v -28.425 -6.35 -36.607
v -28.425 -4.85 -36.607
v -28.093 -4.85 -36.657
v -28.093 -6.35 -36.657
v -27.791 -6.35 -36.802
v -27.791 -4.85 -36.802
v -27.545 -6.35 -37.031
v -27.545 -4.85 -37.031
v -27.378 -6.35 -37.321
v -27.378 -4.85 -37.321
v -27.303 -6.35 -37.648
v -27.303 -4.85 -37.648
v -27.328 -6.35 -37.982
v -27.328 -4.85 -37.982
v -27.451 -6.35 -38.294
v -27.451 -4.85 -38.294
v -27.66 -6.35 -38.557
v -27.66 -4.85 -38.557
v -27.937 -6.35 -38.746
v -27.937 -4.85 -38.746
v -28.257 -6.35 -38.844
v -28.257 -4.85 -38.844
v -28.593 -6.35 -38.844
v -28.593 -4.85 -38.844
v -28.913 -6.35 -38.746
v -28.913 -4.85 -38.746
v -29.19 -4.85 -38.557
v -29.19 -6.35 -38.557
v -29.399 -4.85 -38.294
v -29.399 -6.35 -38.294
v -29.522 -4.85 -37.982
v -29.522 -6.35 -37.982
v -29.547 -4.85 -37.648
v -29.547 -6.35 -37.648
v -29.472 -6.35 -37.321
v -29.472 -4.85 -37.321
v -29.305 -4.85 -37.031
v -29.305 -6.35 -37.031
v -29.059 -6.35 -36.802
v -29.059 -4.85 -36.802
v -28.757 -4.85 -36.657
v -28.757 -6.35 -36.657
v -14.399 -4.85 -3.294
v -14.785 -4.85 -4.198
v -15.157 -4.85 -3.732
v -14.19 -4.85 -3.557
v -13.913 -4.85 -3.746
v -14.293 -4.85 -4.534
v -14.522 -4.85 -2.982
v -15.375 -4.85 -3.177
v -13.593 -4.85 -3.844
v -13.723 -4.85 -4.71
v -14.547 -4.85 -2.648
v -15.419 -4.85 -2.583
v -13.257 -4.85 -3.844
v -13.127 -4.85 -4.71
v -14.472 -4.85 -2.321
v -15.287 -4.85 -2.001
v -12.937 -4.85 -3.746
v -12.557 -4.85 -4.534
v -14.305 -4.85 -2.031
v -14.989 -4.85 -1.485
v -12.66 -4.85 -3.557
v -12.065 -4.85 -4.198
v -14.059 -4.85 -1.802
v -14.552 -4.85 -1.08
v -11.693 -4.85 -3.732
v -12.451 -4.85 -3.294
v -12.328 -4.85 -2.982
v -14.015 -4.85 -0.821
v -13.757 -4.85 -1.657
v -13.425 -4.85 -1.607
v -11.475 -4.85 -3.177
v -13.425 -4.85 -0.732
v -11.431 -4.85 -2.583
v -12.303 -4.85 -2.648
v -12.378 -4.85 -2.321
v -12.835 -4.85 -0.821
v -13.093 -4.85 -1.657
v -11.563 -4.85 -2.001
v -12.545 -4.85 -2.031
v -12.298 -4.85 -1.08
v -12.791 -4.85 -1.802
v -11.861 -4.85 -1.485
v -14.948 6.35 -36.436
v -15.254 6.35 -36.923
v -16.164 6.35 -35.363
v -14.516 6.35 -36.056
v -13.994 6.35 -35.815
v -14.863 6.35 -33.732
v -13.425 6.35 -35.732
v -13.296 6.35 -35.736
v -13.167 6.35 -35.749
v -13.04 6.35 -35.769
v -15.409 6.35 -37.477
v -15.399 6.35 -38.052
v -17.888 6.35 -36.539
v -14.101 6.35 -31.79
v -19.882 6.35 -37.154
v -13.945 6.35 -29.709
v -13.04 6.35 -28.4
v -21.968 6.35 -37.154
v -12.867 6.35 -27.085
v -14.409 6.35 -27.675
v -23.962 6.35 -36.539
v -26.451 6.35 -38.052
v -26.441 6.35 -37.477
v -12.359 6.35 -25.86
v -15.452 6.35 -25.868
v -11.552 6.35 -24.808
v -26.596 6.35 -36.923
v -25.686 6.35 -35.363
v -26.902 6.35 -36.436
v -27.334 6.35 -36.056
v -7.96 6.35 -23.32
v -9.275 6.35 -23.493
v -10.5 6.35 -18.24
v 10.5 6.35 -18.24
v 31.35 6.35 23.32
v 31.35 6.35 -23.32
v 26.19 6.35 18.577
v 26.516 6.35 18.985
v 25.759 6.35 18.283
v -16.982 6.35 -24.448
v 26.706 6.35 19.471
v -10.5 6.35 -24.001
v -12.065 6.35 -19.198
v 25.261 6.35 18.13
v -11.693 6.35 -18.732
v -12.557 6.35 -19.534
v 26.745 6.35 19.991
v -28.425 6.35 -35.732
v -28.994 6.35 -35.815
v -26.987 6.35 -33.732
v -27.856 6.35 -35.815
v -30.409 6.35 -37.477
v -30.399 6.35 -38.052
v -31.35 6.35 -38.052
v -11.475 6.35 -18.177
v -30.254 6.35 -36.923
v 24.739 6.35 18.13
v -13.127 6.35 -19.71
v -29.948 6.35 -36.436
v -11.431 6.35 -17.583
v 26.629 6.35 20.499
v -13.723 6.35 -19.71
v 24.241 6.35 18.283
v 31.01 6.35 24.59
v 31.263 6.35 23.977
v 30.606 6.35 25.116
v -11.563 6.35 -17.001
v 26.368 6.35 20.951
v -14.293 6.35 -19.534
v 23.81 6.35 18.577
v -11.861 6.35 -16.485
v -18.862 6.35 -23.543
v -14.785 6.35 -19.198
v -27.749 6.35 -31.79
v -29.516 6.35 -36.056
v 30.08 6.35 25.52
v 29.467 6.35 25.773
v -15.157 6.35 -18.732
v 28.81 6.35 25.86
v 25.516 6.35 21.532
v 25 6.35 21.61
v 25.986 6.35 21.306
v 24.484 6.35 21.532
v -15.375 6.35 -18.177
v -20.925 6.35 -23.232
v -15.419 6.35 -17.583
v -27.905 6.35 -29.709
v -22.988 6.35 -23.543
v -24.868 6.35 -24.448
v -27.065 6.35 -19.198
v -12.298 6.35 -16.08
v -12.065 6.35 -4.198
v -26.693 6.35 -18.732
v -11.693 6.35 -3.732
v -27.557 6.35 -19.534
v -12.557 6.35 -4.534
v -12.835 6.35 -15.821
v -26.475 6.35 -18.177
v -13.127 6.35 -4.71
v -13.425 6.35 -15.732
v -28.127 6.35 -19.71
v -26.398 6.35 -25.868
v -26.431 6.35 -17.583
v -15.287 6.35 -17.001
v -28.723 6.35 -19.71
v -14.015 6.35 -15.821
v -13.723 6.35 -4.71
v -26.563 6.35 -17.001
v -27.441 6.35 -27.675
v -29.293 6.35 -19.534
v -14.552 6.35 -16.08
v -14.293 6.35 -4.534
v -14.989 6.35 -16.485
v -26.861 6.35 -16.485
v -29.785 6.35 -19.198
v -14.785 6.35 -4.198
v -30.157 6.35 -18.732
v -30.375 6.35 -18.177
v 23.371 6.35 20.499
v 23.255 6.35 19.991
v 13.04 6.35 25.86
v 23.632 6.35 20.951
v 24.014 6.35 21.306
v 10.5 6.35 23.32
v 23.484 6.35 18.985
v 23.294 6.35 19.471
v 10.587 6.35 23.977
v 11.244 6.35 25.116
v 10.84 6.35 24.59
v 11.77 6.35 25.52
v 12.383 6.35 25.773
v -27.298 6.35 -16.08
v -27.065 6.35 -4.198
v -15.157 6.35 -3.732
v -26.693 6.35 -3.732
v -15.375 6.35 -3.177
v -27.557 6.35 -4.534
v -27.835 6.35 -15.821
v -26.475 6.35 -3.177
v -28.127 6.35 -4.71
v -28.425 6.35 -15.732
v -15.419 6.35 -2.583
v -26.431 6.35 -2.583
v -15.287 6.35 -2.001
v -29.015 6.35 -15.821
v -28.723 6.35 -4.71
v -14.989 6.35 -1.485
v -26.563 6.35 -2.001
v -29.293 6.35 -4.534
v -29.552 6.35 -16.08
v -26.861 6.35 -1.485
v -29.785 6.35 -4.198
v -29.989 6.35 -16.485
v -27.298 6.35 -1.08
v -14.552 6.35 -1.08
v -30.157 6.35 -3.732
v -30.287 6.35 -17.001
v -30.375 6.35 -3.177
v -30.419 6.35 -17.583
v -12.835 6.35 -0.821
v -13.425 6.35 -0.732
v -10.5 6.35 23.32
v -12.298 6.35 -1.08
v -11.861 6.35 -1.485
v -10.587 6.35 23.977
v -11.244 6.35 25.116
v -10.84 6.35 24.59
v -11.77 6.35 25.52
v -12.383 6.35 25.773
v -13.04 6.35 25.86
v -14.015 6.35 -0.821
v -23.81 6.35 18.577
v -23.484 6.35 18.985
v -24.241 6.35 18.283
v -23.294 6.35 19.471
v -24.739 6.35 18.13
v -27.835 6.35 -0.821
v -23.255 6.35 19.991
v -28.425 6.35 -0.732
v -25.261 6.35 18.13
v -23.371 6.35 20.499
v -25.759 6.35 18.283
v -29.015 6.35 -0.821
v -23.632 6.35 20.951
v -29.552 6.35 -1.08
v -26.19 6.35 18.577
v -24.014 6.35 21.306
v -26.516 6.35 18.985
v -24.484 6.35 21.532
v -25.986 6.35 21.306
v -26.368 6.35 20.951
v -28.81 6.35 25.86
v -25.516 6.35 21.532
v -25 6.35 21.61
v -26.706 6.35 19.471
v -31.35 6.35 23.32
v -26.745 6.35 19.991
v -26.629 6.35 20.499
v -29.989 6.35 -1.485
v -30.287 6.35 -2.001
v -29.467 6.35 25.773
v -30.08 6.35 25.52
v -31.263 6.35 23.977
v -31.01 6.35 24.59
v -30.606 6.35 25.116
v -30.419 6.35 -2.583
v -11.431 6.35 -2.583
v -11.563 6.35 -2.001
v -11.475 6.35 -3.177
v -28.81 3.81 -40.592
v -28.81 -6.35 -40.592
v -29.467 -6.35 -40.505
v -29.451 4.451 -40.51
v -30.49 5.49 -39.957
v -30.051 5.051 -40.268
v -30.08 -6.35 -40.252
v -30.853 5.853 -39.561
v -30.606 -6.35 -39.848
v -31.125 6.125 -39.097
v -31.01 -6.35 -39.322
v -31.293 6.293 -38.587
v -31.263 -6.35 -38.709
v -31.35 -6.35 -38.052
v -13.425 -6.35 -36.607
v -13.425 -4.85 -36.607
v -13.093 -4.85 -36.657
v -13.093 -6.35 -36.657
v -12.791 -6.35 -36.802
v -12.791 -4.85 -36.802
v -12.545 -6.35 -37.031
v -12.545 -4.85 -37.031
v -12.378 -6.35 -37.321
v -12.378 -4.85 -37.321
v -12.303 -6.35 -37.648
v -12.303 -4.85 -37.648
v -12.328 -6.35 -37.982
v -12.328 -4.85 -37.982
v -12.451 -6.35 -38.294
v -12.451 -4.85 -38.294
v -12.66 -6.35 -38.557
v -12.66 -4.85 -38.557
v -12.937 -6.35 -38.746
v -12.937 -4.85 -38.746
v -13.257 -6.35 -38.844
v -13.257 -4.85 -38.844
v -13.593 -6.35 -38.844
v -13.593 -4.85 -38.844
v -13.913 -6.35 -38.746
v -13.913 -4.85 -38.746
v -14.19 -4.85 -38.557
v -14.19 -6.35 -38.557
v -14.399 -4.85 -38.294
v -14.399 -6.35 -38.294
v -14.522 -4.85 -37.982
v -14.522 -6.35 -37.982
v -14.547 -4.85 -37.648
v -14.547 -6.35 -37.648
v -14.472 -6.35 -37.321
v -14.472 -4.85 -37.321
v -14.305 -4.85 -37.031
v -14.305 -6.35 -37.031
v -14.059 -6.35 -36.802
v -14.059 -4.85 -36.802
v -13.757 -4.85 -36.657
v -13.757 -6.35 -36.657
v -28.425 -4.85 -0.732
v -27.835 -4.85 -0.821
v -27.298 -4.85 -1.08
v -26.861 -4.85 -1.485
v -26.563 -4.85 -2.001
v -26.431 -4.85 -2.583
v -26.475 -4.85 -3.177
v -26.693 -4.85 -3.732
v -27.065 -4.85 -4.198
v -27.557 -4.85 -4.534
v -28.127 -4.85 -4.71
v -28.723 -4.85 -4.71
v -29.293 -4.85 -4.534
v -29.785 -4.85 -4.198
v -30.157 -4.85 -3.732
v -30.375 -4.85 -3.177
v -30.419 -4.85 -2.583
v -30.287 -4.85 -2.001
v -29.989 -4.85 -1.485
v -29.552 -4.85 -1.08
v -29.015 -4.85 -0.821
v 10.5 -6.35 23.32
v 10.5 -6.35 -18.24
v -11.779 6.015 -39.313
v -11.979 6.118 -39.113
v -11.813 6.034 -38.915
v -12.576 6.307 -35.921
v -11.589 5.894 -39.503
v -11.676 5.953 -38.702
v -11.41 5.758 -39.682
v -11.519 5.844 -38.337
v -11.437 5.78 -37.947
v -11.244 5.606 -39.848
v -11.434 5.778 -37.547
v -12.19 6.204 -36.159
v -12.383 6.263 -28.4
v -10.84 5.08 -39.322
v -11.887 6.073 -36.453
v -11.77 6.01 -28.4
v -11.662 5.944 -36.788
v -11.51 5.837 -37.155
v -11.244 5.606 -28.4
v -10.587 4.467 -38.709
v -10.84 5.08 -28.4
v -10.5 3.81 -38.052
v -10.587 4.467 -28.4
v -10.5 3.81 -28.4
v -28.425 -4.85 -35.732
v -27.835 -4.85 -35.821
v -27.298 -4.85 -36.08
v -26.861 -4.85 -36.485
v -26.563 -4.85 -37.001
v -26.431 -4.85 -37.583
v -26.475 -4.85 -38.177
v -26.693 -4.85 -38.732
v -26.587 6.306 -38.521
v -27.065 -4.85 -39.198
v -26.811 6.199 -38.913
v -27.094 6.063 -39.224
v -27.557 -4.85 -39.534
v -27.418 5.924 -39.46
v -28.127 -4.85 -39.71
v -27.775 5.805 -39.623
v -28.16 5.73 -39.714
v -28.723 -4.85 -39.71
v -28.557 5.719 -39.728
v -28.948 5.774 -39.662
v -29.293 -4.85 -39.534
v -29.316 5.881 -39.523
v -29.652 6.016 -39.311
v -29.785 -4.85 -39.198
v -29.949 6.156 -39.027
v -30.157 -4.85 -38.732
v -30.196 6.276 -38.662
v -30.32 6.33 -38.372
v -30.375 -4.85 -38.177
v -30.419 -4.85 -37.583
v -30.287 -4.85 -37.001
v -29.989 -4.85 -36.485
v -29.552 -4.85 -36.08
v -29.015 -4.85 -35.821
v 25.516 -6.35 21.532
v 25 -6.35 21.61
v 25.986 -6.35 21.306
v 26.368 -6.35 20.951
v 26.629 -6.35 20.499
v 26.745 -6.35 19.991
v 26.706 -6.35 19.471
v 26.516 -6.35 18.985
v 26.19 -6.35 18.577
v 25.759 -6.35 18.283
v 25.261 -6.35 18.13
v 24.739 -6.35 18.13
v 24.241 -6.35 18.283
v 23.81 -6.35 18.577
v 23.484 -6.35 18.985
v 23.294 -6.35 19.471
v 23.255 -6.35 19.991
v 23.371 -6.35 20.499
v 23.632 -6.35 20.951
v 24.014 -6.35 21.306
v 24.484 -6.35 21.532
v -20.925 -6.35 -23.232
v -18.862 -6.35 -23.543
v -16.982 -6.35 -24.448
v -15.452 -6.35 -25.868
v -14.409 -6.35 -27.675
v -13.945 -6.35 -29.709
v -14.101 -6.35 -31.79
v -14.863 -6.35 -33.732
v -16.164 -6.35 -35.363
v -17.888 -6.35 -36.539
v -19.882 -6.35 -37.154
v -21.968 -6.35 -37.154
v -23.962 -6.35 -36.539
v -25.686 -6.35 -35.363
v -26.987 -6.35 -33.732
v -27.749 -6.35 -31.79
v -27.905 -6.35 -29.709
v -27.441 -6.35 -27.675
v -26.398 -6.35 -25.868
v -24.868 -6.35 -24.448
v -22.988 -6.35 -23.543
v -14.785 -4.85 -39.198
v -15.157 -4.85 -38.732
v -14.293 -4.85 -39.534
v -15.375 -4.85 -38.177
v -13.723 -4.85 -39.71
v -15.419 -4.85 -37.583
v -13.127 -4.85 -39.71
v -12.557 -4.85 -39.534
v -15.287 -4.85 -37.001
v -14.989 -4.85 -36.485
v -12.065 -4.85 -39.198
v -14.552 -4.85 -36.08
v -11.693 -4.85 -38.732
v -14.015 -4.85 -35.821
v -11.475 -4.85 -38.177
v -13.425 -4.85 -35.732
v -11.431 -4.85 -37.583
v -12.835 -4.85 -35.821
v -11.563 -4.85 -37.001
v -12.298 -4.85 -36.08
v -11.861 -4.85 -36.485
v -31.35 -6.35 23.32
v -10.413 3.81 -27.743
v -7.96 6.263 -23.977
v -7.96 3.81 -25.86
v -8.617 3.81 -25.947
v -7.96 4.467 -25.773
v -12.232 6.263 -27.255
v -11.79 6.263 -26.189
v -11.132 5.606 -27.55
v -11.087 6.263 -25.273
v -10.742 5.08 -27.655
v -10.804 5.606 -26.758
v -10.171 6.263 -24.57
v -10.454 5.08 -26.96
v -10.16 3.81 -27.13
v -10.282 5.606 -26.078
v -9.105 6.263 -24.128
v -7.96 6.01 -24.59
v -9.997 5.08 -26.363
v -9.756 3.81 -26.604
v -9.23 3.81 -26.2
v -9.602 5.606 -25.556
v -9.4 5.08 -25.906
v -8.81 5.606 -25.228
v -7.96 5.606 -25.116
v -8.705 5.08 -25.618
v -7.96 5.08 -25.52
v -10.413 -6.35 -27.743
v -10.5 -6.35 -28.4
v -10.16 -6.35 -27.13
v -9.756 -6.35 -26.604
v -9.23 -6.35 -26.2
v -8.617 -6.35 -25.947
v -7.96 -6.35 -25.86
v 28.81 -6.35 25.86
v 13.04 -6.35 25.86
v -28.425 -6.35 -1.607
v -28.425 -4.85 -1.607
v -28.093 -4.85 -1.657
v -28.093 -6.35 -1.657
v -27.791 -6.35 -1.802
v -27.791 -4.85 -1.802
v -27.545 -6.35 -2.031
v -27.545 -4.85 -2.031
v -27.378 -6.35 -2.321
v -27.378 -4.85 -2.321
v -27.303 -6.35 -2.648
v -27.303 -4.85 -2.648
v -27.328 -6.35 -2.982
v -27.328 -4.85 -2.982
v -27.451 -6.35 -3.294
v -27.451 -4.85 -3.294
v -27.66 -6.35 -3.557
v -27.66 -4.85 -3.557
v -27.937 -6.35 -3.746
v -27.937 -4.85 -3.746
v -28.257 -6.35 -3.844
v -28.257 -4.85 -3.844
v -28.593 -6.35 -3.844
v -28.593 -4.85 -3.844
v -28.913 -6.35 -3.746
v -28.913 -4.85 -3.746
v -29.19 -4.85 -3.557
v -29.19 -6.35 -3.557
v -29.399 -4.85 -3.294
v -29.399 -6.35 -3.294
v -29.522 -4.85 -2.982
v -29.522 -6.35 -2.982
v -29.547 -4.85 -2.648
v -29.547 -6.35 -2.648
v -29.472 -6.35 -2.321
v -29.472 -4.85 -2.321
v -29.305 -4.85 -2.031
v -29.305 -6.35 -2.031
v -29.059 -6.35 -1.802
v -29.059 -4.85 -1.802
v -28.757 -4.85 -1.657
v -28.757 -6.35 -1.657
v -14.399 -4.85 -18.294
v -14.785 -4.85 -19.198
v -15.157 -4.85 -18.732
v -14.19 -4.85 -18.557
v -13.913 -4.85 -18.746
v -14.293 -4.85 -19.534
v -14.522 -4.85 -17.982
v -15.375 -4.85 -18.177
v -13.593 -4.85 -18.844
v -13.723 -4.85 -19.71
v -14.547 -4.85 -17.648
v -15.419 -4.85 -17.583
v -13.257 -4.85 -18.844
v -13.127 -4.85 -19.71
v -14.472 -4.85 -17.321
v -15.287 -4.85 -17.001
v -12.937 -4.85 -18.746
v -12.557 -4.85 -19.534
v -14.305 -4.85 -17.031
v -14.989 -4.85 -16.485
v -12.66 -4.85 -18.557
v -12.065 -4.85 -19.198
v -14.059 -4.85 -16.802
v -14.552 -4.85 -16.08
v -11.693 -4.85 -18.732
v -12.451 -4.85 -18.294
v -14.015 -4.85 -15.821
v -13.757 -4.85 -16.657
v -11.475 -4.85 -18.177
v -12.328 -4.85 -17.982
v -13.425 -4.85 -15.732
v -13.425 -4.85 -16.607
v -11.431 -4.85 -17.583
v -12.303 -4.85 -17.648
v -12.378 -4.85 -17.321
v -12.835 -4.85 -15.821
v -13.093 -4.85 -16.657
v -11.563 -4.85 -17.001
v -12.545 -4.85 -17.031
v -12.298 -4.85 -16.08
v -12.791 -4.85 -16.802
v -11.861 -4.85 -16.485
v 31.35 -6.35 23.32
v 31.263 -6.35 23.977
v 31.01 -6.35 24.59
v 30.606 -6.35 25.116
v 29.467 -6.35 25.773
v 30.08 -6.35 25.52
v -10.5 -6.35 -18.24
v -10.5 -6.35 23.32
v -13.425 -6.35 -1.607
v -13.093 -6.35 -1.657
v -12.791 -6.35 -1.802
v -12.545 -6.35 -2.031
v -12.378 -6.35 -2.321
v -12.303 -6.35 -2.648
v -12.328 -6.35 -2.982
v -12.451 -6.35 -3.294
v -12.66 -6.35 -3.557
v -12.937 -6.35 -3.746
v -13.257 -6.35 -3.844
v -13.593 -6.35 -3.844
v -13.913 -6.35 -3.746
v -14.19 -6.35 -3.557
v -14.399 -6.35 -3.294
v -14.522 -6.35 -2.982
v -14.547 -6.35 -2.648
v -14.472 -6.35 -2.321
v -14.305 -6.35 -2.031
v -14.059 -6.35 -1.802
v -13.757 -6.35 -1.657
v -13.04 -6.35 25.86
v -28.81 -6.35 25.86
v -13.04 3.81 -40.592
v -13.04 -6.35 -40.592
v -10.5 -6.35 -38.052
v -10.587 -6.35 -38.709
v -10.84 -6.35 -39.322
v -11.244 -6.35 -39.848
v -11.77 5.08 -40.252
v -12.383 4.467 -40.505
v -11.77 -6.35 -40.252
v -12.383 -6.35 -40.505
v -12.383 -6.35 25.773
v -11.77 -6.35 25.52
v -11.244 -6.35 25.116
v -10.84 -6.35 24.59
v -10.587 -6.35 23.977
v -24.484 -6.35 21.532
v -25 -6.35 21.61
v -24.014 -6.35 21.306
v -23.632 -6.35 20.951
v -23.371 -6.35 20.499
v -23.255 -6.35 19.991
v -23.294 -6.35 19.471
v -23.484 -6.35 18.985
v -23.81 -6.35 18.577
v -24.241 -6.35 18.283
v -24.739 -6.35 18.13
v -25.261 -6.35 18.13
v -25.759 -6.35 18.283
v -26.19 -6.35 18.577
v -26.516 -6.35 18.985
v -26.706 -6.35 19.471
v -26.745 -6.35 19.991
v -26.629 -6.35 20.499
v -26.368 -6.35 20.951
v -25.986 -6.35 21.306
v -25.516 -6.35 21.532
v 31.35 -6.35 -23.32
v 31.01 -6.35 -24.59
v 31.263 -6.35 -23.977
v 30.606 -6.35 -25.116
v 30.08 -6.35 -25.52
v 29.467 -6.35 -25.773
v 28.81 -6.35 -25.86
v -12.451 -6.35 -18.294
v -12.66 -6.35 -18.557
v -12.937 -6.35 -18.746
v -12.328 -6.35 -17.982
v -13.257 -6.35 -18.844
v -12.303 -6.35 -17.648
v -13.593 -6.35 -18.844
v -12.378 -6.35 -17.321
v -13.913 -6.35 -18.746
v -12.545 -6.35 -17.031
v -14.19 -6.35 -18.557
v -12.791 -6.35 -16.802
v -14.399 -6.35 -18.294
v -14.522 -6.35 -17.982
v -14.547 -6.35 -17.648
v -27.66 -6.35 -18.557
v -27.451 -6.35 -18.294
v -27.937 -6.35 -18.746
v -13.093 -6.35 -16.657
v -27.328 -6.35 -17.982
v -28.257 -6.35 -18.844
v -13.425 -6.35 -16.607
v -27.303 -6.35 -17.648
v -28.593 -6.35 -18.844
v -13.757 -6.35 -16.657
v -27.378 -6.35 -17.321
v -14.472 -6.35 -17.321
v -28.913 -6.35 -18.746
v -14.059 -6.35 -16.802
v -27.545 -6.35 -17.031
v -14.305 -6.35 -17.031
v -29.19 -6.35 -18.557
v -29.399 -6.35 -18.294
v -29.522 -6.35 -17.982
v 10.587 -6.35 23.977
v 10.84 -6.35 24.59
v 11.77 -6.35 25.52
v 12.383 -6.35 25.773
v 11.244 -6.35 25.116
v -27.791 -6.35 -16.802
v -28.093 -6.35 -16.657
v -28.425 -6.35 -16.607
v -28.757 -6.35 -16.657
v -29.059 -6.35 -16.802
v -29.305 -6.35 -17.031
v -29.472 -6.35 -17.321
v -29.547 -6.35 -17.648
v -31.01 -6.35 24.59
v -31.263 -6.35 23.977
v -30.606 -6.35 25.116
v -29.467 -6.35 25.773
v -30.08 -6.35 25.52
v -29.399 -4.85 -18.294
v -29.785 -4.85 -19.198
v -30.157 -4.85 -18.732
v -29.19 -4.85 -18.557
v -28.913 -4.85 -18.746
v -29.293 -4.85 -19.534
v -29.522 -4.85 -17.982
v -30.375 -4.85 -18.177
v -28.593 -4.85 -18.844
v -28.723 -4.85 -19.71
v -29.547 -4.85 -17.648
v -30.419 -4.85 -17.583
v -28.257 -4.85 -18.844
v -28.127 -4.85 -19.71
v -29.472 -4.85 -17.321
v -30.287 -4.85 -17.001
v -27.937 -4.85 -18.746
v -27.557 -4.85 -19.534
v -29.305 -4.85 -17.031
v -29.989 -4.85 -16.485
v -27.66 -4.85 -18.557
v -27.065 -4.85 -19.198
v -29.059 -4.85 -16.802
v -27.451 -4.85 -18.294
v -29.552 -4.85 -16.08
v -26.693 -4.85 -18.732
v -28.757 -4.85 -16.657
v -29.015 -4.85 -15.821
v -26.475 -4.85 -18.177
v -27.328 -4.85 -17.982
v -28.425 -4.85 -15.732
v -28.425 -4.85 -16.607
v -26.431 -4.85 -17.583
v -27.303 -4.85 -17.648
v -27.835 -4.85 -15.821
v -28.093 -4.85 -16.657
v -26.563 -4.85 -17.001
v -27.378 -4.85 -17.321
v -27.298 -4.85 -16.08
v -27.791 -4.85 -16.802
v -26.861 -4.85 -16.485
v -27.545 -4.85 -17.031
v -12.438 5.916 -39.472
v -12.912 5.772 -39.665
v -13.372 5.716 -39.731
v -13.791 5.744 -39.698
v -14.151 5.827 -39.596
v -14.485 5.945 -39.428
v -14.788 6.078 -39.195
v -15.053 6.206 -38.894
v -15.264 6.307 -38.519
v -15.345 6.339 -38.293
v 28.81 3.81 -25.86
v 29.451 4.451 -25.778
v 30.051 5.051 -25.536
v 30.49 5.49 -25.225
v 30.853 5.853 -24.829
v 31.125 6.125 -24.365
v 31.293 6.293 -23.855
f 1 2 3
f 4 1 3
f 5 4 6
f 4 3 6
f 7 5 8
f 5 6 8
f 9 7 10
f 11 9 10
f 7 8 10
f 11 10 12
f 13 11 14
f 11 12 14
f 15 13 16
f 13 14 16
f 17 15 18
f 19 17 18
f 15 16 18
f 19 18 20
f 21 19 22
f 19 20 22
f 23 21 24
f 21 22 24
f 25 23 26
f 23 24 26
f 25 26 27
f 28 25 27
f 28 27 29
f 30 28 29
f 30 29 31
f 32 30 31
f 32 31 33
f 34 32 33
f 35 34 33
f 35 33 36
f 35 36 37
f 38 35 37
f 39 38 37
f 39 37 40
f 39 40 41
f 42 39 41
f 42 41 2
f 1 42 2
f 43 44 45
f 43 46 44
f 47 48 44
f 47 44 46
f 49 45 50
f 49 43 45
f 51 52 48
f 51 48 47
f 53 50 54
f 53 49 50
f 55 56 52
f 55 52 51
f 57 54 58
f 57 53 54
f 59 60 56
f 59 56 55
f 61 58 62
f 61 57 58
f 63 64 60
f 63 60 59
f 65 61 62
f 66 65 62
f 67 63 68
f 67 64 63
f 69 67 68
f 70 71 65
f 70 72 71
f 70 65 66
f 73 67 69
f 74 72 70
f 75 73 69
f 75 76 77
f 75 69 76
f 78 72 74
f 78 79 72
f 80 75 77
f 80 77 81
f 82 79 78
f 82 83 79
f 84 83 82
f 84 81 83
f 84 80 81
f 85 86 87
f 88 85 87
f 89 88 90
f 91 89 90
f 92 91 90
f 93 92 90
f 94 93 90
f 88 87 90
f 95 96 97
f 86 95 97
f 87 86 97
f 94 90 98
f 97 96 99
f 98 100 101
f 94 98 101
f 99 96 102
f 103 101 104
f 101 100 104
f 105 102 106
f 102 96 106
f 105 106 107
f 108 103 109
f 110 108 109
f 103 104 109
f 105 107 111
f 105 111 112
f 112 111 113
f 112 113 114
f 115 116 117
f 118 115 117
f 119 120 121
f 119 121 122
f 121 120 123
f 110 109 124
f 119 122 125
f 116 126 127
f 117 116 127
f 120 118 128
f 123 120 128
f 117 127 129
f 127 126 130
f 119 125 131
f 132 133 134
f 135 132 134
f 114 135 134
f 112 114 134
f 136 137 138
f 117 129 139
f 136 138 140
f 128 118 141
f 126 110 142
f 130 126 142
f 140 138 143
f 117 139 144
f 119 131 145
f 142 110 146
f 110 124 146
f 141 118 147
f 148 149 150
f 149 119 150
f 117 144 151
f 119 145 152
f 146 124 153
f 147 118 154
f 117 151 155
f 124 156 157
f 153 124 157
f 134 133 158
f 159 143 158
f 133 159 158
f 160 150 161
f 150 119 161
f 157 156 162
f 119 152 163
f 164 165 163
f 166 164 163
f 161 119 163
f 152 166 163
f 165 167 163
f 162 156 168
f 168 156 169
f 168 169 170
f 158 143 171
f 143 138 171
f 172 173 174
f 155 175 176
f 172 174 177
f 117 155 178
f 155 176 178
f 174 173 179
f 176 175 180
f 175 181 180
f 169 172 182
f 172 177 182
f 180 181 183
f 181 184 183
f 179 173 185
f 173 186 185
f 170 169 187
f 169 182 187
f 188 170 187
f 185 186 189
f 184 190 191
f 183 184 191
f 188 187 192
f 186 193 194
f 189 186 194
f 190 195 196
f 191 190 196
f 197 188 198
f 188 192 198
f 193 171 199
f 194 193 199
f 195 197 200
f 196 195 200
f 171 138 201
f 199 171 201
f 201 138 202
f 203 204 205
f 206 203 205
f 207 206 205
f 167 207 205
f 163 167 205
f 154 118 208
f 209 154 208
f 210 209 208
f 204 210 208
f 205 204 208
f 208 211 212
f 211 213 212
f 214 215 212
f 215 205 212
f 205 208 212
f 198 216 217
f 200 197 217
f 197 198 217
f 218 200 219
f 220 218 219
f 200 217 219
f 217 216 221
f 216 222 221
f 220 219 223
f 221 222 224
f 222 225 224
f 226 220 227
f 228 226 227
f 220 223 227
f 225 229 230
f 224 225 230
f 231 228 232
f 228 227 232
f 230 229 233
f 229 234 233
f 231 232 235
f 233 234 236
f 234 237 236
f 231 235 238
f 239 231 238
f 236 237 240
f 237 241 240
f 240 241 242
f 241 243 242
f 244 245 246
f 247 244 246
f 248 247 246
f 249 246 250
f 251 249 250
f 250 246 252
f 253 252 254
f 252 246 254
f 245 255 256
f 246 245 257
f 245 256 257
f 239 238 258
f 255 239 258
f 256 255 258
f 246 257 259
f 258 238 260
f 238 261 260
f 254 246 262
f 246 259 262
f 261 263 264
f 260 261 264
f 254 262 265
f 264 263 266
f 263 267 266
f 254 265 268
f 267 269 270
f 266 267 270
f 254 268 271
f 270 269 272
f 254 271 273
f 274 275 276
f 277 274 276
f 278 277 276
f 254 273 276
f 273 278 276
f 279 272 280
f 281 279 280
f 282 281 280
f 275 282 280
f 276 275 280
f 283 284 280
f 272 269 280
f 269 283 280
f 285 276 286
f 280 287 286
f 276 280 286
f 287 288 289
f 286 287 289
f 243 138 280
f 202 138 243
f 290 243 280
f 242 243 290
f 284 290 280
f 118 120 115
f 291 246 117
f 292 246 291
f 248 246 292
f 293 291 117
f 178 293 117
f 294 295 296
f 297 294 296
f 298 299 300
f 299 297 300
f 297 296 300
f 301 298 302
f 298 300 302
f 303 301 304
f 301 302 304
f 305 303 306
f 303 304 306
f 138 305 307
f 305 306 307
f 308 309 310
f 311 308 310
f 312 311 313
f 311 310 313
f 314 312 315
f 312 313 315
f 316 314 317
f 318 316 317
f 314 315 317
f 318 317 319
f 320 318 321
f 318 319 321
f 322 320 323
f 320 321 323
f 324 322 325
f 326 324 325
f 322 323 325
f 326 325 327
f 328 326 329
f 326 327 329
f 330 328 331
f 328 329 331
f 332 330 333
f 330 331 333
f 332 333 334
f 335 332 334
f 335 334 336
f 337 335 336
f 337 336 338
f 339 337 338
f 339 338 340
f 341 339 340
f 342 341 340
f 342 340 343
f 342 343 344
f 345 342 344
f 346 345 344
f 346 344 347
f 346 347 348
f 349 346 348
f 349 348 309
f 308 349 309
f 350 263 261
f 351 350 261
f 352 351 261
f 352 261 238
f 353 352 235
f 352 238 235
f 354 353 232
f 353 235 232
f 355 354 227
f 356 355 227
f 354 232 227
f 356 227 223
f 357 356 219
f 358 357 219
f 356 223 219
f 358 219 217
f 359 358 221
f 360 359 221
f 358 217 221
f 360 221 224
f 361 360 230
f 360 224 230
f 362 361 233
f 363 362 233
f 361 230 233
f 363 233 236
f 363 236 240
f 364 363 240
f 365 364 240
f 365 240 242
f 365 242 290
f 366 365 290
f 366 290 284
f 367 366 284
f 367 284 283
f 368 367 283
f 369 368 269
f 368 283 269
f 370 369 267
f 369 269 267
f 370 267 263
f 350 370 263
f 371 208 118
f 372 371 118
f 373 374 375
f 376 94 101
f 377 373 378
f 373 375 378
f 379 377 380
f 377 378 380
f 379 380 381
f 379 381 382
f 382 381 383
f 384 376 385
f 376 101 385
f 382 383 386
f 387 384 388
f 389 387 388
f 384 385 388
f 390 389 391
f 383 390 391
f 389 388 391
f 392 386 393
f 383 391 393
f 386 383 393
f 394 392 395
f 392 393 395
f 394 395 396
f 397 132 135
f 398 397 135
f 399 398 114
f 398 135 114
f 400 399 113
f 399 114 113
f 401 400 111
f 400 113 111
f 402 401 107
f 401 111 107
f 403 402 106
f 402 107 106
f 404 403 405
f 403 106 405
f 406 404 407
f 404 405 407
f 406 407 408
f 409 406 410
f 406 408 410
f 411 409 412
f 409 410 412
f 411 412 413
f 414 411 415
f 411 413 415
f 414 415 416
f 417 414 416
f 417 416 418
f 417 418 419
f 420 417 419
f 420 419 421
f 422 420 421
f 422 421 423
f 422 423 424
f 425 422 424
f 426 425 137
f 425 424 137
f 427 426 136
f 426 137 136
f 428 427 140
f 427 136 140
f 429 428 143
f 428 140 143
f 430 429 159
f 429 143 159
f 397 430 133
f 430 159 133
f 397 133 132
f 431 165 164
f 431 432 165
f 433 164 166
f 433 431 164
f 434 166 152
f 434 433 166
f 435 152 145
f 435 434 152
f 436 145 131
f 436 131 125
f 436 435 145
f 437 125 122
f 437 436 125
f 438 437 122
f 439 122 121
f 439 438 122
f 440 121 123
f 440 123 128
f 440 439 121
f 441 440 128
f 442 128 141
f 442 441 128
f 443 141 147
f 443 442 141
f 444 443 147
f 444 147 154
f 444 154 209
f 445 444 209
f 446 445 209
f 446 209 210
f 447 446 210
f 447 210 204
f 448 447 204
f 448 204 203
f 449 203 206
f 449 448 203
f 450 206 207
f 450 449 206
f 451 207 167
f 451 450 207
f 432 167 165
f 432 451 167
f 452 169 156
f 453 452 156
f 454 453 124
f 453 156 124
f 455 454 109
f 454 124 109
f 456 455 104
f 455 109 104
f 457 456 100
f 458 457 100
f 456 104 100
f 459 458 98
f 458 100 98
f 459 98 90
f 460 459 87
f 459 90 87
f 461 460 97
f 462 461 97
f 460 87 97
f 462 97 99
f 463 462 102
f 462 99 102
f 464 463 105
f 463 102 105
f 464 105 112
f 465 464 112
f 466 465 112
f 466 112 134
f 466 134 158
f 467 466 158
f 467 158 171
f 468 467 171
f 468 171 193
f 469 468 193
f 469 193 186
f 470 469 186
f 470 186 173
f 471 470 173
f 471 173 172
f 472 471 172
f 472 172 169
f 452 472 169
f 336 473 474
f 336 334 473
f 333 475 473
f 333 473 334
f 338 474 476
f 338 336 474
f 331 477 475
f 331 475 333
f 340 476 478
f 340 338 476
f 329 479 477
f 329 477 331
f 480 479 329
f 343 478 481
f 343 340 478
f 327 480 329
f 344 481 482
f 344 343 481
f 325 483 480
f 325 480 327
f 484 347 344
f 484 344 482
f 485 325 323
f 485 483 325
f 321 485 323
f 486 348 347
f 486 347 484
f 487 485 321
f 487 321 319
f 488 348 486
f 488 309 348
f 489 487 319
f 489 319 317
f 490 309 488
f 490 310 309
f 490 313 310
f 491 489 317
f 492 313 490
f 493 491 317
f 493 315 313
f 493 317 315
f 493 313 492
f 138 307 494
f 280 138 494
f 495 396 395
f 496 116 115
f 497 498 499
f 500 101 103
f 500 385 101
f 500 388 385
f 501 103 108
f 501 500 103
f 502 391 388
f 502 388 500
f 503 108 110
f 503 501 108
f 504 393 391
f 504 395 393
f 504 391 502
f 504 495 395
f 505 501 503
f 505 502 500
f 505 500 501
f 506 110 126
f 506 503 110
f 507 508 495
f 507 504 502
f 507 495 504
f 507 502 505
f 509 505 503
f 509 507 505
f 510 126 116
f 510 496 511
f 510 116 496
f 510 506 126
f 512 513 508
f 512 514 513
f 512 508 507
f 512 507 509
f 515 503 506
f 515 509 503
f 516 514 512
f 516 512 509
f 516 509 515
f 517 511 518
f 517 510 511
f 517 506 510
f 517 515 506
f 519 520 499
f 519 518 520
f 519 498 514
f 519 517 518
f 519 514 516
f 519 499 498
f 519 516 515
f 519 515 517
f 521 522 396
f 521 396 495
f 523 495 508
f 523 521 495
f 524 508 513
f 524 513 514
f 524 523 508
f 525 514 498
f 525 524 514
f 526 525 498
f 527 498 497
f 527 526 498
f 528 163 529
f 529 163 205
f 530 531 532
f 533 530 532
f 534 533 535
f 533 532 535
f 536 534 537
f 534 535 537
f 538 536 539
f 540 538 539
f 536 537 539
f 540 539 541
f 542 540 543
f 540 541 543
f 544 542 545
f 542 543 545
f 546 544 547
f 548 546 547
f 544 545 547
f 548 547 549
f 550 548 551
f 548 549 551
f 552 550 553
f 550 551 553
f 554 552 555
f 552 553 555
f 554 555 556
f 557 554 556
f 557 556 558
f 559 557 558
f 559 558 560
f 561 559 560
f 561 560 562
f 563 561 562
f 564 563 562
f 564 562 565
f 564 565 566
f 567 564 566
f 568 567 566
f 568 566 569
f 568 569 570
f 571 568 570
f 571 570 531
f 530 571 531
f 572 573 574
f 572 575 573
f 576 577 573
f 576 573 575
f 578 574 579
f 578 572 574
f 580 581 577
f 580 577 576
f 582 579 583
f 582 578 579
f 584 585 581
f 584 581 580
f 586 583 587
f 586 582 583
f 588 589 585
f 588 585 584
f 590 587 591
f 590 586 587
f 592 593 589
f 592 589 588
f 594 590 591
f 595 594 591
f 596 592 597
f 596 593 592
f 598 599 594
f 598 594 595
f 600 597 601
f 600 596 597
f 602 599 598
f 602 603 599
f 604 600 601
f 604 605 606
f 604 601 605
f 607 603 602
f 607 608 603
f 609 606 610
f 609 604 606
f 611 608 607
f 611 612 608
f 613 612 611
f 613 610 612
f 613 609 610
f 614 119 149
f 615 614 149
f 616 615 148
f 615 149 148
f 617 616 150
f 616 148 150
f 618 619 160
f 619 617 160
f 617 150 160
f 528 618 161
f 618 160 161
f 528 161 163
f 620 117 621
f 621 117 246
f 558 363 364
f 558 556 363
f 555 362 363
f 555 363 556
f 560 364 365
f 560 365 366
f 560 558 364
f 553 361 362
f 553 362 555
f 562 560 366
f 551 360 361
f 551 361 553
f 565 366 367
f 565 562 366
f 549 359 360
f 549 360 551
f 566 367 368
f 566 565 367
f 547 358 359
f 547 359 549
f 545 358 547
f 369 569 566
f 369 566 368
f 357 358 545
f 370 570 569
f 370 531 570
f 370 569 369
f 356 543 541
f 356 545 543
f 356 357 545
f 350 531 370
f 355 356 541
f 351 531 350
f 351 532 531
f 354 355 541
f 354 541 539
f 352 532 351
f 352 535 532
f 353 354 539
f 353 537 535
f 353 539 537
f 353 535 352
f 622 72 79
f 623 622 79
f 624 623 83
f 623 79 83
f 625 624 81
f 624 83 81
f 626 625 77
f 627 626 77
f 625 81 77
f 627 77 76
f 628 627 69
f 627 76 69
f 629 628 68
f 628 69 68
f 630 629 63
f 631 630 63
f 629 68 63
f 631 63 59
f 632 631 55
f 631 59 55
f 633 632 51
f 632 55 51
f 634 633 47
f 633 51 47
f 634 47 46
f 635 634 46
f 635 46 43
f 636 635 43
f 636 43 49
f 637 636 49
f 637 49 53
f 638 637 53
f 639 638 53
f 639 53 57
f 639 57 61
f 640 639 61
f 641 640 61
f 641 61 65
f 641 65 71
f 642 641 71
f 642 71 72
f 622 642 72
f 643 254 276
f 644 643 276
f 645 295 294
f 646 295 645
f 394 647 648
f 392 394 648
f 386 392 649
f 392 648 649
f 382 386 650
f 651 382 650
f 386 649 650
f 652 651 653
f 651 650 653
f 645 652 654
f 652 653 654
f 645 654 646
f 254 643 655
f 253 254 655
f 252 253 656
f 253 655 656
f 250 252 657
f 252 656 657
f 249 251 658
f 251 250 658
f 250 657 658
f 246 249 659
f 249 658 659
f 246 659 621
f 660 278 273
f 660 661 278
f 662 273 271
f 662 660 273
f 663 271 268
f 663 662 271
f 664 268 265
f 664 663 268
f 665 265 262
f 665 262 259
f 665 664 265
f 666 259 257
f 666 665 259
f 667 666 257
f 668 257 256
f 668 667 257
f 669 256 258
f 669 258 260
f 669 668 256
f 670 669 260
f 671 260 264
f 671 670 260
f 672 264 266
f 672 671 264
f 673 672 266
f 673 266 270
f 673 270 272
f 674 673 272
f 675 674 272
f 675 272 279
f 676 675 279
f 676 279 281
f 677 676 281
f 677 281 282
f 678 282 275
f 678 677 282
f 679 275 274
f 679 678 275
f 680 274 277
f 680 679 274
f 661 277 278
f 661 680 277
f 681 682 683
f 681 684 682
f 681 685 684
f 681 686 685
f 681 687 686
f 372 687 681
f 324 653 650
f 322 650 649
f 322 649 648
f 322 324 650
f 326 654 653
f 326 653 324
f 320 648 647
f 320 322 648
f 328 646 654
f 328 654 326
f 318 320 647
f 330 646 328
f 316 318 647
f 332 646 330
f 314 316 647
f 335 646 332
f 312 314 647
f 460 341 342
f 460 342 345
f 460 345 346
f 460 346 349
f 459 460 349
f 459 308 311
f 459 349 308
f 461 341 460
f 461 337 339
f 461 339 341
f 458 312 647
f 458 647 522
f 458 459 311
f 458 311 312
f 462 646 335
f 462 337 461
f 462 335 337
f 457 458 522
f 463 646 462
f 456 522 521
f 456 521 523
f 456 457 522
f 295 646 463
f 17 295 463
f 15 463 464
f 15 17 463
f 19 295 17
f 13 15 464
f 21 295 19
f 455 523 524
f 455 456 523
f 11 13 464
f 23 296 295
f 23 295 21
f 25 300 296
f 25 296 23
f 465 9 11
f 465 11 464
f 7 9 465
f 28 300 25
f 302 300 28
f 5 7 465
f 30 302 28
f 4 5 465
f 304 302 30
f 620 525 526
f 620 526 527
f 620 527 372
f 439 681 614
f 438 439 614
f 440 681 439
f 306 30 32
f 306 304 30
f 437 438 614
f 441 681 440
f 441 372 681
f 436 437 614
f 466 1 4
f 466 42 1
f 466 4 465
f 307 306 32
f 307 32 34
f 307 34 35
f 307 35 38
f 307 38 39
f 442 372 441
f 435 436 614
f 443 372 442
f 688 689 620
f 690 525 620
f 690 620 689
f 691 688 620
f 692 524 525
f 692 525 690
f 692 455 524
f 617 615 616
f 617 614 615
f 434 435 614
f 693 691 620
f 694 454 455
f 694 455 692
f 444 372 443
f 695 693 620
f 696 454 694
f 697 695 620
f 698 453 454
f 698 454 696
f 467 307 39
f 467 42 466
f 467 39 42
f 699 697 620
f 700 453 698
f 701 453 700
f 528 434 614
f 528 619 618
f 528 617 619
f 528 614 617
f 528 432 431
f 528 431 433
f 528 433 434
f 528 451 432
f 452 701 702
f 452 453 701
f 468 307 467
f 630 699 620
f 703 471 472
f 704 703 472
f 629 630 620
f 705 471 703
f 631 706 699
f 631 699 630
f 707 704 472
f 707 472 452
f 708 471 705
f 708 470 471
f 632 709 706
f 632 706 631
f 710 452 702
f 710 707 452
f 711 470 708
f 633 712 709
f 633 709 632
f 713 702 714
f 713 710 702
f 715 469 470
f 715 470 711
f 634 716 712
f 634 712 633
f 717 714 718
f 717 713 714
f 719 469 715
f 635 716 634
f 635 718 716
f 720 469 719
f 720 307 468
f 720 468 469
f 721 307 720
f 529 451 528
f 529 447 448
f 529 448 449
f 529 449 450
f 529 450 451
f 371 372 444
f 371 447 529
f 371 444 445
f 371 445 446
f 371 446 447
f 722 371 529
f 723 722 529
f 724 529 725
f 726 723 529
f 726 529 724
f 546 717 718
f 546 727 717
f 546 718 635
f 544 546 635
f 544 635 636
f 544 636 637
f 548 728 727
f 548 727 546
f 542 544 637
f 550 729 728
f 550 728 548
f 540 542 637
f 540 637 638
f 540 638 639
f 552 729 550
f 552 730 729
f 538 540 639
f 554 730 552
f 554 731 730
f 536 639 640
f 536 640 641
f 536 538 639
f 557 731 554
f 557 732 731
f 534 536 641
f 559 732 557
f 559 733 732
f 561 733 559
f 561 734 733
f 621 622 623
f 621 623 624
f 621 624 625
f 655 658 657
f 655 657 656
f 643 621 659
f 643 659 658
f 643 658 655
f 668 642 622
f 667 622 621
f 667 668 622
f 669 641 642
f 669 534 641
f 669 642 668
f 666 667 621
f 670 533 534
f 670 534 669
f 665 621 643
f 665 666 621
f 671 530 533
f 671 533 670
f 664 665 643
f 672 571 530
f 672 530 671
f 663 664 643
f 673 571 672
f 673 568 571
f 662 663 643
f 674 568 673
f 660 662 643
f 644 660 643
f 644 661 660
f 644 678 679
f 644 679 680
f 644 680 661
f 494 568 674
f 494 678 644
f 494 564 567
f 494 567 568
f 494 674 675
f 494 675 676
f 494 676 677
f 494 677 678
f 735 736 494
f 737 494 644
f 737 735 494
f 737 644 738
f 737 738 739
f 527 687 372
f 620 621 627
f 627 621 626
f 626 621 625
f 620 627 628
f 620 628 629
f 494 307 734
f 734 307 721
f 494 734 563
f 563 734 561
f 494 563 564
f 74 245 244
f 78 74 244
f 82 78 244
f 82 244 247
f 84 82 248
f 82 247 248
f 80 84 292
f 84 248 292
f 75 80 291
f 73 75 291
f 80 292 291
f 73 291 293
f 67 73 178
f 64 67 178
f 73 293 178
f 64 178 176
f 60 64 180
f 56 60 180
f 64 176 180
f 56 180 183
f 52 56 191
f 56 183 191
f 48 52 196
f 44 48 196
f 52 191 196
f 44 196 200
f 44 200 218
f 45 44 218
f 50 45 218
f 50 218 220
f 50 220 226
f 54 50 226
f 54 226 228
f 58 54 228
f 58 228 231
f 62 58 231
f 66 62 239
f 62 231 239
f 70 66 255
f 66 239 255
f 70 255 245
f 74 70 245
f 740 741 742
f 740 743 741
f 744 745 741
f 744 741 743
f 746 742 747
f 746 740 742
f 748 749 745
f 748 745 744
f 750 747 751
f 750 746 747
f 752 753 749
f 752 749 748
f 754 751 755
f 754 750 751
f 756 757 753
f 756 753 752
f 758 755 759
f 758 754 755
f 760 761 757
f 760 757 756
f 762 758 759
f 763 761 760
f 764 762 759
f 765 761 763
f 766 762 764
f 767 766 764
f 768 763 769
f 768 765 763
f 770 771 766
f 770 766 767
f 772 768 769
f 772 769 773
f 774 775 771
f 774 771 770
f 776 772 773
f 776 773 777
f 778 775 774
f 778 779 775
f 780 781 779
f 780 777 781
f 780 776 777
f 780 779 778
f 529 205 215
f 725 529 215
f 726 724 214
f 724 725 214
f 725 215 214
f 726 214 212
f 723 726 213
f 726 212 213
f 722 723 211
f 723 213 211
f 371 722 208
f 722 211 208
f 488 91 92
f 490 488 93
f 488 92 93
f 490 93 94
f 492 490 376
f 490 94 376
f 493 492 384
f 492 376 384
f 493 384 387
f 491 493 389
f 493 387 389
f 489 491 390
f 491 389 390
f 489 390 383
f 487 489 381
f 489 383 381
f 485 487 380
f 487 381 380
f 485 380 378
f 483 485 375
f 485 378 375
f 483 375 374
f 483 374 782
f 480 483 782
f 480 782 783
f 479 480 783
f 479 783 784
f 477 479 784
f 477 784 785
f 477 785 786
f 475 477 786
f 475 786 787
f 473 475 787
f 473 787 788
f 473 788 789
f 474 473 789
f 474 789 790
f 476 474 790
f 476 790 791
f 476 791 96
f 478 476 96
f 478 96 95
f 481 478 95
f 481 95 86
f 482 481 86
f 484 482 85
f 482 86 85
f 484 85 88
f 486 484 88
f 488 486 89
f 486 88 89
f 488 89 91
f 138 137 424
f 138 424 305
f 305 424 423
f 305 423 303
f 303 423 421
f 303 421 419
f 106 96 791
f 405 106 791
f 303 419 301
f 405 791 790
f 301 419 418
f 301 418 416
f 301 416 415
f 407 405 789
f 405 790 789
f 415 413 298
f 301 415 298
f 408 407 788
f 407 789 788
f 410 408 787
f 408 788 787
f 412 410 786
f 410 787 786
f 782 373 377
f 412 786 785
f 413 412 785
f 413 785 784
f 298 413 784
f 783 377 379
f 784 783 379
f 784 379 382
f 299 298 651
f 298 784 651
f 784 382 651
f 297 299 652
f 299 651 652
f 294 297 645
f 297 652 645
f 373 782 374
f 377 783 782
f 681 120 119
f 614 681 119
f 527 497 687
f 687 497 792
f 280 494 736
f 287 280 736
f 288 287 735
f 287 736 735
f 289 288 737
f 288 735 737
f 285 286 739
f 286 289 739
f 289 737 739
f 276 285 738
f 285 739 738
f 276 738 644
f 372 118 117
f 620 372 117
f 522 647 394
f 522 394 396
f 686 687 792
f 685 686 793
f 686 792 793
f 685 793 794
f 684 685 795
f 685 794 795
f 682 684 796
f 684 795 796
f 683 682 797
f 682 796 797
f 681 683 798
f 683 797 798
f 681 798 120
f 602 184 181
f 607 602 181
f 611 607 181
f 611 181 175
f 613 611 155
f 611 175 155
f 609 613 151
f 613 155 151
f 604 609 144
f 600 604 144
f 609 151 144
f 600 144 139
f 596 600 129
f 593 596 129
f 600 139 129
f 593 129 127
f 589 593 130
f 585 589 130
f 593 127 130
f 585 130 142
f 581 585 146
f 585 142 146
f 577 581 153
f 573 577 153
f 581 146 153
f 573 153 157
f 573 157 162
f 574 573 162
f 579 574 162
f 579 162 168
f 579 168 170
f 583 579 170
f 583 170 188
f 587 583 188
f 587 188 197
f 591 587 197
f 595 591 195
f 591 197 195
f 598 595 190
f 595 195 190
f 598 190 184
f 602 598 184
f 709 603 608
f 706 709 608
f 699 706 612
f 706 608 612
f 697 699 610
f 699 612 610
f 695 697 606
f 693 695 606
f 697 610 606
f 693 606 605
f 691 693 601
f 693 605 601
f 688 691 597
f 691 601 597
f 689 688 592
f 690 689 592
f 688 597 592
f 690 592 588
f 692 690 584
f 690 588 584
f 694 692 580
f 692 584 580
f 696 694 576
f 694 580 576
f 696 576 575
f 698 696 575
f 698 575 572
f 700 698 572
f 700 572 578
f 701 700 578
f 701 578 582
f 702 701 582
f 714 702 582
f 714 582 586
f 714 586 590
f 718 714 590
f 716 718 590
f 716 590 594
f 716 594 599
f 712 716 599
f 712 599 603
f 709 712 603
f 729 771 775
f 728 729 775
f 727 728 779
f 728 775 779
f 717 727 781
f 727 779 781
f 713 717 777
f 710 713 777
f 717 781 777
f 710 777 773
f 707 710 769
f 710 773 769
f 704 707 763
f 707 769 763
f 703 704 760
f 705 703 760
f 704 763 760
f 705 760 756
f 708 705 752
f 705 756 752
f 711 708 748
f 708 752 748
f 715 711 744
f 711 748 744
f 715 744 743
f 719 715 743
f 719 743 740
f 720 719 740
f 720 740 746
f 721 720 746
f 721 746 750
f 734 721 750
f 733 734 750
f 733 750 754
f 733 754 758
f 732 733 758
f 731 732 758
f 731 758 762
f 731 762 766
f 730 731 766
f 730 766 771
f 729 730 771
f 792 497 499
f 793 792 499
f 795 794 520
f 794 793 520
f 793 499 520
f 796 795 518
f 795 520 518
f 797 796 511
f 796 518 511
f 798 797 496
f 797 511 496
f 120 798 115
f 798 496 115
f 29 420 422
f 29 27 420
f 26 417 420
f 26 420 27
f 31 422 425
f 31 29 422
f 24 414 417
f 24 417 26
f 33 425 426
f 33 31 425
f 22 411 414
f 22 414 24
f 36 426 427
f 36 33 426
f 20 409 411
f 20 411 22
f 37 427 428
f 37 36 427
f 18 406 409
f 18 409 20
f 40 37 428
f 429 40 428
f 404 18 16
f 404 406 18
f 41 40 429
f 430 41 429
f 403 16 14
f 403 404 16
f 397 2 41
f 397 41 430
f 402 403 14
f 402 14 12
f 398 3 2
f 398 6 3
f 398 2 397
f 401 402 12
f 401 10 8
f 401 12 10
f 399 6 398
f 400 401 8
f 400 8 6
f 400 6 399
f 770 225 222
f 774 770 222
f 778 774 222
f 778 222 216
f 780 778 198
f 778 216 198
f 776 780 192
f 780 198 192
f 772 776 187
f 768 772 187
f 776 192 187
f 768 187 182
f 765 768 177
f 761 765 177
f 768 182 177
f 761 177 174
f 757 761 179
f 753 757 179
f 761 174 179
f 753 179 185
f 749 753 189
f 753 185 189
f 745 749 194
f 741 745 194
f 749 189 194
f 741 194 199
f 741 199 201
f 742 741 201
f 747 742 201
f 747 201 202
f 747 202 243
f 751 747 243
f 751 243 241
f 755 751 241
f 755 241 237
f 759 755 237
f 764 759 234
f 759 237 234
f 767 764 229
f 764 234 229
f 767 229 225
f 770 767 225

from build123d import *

# Parameters (mm, degrees)
SKETCH1_R           = 1.75
BOSS_EXTRUDE1_DEPTH = 6.35
SKETCH5_W           = 20.85
SKETCH5_H           = 14.732
BOSS_EXTRUDE2_DEPTH = 12.7
SKETCH2_R           = 1.125
CUT_EXTRUDE1_DEPTH  = 53.837699391
SKETCH3_R           = 2
CUT_EXTRUDE2_DEPTH  = 11.2
FILLET1_R           = 2.54
FILLET2_R           = 2.54
SKETCH6_R           = 7
CUT_EXTRUDE3_DEPTH  = 53.837699527


with BuildPart() as part:
    # Sketch1 → Boss-Extrude1 (new, symmetric)
    with BuildSketch(Plane(origin=(0, 0, 0), x_dir=(1, 0, 0), z_dir=(0, 1, 0))):
        Polygon((-31.35, -25.859994), (-31.35, 25.859994), (31.35, 25.859994), (31.35, -25.859994), (10.5, -25.859994), (10.5, 18.239994), (-10.5, 18.239994), (-10.5, -25.859994), align=None)
        with Locations(Location((-25, -19.860006, 0), (0, 0, 270))):
            Circle(SKETCH1_R, mode=Mode.SUBTRACT)
        with Locations(Location((25, -19.860006, 0), (0, 0, 270))):
            Circle(SKETCH1_R, mode=Mode.SUBTRACT)
    extrude(amount=BOSS_EXTRUDE1_DEPTH, both=True)

    # Sketch5 → Boss-Extrude2 (add, through all)
    with BuildSketch(Plane.XZ.offset(6.35)):
        with Locations((-20.925, -33.225994)):
            Rectangle(SKETCH5_W, SKETCH5_H)
    extrude(amount=-BOSS_EXTRUDE2_DEPTH)

    # Sketch2 → Cut-Extrude1 (cut, through all)
    with BuildSketch(Plane(origin=(0, 6.35, 0), x_dir=(1, 0, 0), z_dir=(0, 1, 0))):
        with Locations(Location((-28.425, 17.731994, 0), (0, 0, 270))):
            Circle(SKETCH2_R)
        with Locations(Location((-13.425, 17.731994, 0), (0, 0, 270))):
            Circle(SKETCH2_R)
        with Locations(Location((-13.425, 2.731994, 0), (0, 0, 270))):
            Circle(SKETCH2_R)
        with Locations(Location((-28.425, 2.731994, 0), (0, 0, 270))):
            Circle(SKETCH2_R)
        with Locations(Location((-13.425, 37.731994, 0), (0, 0, 270))):
            Circle(SKETCH2_R)
        with Locations(Location((-28.425, 37.731994, 0), (0, 0, 270))):
            Circle(SKETCH2_R)
    extrude(amount=-CUT_EXTRUDE1_DEPTH, mode=Mode.SUBTRACT)

    # Sketch3 → Cut-Extrude2 (cut)
    with BuildSketch(Plane(origin=(0, 6.35, 0), x_dir=(1, 0, 0), z_dir=(0, 1, 0))):
        with Locations(Location((-28.425, 17.731994, 0), (0, 0, 270))):
            Circle(SKETCH3_R)
        with Locations(Location((-13.425, 17.731994, 0), (0, 0, 270))):
            Circle(SKETCH3_R)
        with Locations(Location((-13.425, 2.731994, 0), (0, 0, 270))):
            Circle(SKETCH3_R)
        with Locations(Location((-28.425, 2.731994, 0), (0, 0, 270))):
            Circle(SKETCH3_R)
        with Locations(Location((-28.425, 37.731994, 0), (0, 0, 270))):
            Circle(SKETCH3_R)
        with Locations(Location((-13.425, 37.731994, 0), (0, 0, 270))):
            Circle(SKETCH3_R)
    extrude(amount=-CUT_EXTRUDE2_DEPTH, mode=Mode.SUBTRACT)

    # Fillet1
    # the kernel refuses this fillet: 2.54 mm, written as the material it adds along each edge
    with BuildSketch(Plane(origin=(-10.5, -6.35, -25.859994), x_dir=(0, 0, -1), z_dir=(0, 1, 0))) as fillet1_piece_1:
        with BuildLine():
            CenterArc((FILLET1_R, -FILLET1_R), FILLET1_R, 90, 90)
            Line((0, -FILLET1_R), (0, 0))
            Line((0, 0), (FILLET1_R, 0))
        make_face()
    extrude(amount=12.7)
    # the kernel refuses this fillet: 2.54 mm, written as the material it takes off along each edge
    with BuildSketch(Plane(origin=(-31.35, -12.7, 25.859994), x_dir=(0, 0, -1), z_dir=(0, 1, 0)), Plane(origin=(31.35, 12.7, -25.859994), x_dir=(-1, 0, 0), z_dir=(0, -1, 0)), Plane(origin=(31.35, 12.7, 25.859994), x_dir=(0, 0, -1), z_dir=(0, -1, 0)), Plane(origin=(-10.5, -12.7, 25.859994), x_dir=(-1, 0, 0), z_dir=(0, 1, 0))) as fillet1_2_piece_1:
        with BuildLine():
            CenterArc((FILLET1_R, -FILLET1_R), FILLET1_R, 90, 90)
            Line((0, -FILLET1_R), (0, 0))
            Line((0, 0), (FILLET1_R, 0))
        make_face()
    extrude(amount=25.4, mode=Mode.SUBTRACT)
    with BuildSketch(Plane(origin=(10.5, 12.7, 25.859994), x_dir=(0, 0, -1), z_dir=(0, -1, 0)), Plane(origin=(-31.35, -12.7, -40.591994), x_dir=(0, 0, 1), z_dir=(0, 1, 0)), Plane(origin=(-10.5, -12.7, -40.591994), x_dir=(-1, 0, 0), z_dir=(0, 1, 0))) as fillet1_2_piece_2:
        with BuildLine():
            CenterArc((FILLET1_R, FILLET1_R), FILLET1_R, 180, 90)
            Line((0, FILLET1_R), (0, 0))
            Line((0, 0), (FILLET1_R, 0))
        make_face()
    extrude(amount=25.4, mode=Mode.SUBTRACT)
    with BuildSketch(Plane(origin=(-7.96, 6.35, -25.859994), x_dir=(0, 0, 1), z_dir=(1, 0, 0))) as fillet1_2_piece_3:
        with BuildLine():
            CenterArc((FILLET1_R, FILLET1_R), FILLET1_R, 180, 90)
            Line((0, FILLET1_R), (0, 0))
            Line((0, 0), (FILLET1_R, 0))
        make_face()
    extrude(amount=45.66, mode=Mode.SUBTRACT)
    with BuildSketch(Plane(origin=(-10.5, 6.35, -28.399994), x_dir=(-1, 0, 0), z_dir=(0, 0, -1))) as fillet1_2_piece_4:
        with BuildLine():
            CenterArc((FILLET1_R, -FILLET1_R), FILLET1_R, 90, 90)
            Line((0, -FILLET1_R), (0, 0))
            Line((0, 0), (FILLET1_R, 0))
        make_face()
    extrude(amount=18.542, mode=Mode.SUBTRACT)
    with BuildSketch(Plane(origin=(-7.96, 6.35, -28.399994), x_dir=(-1, 0, 0), z_dir=(0, 0, -1))) as fillet1_2_piece_5:
        with BuildLine():
            CenterArc((2.54 + FILLET1_R, -FILLET1_R), FILLET1_R, 90, 90)
            Line((2.54, -FILLET1_R), (2.54, 0))
            Line((2.54, 0), (2.54 + FILLET1_R, 0))
        make_face()
    revolve(axis=Axis((-7.96, 6.35, -28.399994), (0, 1, 0)), revolution_arc=90, mode=Mode.SUBTRACT)

    # Fillet2
    # the kernel refuses this fillet: 2.54 mm, written as the material it takes off along each edge
    with BuildSketch(Plane(origin=(-6.69, 6.35, -40.591994), x_dir=(0, -1, 0), z_dir=(-1, 0, 0))) as fillet2_piece_1:
        with BuildLine():
            CenterArc((FILLET2_R, FILLET2_R), FILLET2_R, 180, 90)
            Line((0, FILLET2_R), (0, 0))
            Line((0, 0), (FILLET2_R, 0))
        make_face()
    extrude(amount=28.47, mode=Mode.SUBTRACT)

    # Sketch6 → Cut-Extrude3 (cut, through all)
    with BuildSketch(Plane(origin=(0, 6.35, 0), x_dir=(1, 0, 0), z_dir=(0, 1, 0))):
        with Locations(Location((-20.925, 30.231994, 0), (0, 0, 270))):
            Circle(SKETCH6_R)
    extrude(amount=-CUT_EXTRUDE3_DEPTH, mode=Mode.SUBTRACT)


solid = part.part
